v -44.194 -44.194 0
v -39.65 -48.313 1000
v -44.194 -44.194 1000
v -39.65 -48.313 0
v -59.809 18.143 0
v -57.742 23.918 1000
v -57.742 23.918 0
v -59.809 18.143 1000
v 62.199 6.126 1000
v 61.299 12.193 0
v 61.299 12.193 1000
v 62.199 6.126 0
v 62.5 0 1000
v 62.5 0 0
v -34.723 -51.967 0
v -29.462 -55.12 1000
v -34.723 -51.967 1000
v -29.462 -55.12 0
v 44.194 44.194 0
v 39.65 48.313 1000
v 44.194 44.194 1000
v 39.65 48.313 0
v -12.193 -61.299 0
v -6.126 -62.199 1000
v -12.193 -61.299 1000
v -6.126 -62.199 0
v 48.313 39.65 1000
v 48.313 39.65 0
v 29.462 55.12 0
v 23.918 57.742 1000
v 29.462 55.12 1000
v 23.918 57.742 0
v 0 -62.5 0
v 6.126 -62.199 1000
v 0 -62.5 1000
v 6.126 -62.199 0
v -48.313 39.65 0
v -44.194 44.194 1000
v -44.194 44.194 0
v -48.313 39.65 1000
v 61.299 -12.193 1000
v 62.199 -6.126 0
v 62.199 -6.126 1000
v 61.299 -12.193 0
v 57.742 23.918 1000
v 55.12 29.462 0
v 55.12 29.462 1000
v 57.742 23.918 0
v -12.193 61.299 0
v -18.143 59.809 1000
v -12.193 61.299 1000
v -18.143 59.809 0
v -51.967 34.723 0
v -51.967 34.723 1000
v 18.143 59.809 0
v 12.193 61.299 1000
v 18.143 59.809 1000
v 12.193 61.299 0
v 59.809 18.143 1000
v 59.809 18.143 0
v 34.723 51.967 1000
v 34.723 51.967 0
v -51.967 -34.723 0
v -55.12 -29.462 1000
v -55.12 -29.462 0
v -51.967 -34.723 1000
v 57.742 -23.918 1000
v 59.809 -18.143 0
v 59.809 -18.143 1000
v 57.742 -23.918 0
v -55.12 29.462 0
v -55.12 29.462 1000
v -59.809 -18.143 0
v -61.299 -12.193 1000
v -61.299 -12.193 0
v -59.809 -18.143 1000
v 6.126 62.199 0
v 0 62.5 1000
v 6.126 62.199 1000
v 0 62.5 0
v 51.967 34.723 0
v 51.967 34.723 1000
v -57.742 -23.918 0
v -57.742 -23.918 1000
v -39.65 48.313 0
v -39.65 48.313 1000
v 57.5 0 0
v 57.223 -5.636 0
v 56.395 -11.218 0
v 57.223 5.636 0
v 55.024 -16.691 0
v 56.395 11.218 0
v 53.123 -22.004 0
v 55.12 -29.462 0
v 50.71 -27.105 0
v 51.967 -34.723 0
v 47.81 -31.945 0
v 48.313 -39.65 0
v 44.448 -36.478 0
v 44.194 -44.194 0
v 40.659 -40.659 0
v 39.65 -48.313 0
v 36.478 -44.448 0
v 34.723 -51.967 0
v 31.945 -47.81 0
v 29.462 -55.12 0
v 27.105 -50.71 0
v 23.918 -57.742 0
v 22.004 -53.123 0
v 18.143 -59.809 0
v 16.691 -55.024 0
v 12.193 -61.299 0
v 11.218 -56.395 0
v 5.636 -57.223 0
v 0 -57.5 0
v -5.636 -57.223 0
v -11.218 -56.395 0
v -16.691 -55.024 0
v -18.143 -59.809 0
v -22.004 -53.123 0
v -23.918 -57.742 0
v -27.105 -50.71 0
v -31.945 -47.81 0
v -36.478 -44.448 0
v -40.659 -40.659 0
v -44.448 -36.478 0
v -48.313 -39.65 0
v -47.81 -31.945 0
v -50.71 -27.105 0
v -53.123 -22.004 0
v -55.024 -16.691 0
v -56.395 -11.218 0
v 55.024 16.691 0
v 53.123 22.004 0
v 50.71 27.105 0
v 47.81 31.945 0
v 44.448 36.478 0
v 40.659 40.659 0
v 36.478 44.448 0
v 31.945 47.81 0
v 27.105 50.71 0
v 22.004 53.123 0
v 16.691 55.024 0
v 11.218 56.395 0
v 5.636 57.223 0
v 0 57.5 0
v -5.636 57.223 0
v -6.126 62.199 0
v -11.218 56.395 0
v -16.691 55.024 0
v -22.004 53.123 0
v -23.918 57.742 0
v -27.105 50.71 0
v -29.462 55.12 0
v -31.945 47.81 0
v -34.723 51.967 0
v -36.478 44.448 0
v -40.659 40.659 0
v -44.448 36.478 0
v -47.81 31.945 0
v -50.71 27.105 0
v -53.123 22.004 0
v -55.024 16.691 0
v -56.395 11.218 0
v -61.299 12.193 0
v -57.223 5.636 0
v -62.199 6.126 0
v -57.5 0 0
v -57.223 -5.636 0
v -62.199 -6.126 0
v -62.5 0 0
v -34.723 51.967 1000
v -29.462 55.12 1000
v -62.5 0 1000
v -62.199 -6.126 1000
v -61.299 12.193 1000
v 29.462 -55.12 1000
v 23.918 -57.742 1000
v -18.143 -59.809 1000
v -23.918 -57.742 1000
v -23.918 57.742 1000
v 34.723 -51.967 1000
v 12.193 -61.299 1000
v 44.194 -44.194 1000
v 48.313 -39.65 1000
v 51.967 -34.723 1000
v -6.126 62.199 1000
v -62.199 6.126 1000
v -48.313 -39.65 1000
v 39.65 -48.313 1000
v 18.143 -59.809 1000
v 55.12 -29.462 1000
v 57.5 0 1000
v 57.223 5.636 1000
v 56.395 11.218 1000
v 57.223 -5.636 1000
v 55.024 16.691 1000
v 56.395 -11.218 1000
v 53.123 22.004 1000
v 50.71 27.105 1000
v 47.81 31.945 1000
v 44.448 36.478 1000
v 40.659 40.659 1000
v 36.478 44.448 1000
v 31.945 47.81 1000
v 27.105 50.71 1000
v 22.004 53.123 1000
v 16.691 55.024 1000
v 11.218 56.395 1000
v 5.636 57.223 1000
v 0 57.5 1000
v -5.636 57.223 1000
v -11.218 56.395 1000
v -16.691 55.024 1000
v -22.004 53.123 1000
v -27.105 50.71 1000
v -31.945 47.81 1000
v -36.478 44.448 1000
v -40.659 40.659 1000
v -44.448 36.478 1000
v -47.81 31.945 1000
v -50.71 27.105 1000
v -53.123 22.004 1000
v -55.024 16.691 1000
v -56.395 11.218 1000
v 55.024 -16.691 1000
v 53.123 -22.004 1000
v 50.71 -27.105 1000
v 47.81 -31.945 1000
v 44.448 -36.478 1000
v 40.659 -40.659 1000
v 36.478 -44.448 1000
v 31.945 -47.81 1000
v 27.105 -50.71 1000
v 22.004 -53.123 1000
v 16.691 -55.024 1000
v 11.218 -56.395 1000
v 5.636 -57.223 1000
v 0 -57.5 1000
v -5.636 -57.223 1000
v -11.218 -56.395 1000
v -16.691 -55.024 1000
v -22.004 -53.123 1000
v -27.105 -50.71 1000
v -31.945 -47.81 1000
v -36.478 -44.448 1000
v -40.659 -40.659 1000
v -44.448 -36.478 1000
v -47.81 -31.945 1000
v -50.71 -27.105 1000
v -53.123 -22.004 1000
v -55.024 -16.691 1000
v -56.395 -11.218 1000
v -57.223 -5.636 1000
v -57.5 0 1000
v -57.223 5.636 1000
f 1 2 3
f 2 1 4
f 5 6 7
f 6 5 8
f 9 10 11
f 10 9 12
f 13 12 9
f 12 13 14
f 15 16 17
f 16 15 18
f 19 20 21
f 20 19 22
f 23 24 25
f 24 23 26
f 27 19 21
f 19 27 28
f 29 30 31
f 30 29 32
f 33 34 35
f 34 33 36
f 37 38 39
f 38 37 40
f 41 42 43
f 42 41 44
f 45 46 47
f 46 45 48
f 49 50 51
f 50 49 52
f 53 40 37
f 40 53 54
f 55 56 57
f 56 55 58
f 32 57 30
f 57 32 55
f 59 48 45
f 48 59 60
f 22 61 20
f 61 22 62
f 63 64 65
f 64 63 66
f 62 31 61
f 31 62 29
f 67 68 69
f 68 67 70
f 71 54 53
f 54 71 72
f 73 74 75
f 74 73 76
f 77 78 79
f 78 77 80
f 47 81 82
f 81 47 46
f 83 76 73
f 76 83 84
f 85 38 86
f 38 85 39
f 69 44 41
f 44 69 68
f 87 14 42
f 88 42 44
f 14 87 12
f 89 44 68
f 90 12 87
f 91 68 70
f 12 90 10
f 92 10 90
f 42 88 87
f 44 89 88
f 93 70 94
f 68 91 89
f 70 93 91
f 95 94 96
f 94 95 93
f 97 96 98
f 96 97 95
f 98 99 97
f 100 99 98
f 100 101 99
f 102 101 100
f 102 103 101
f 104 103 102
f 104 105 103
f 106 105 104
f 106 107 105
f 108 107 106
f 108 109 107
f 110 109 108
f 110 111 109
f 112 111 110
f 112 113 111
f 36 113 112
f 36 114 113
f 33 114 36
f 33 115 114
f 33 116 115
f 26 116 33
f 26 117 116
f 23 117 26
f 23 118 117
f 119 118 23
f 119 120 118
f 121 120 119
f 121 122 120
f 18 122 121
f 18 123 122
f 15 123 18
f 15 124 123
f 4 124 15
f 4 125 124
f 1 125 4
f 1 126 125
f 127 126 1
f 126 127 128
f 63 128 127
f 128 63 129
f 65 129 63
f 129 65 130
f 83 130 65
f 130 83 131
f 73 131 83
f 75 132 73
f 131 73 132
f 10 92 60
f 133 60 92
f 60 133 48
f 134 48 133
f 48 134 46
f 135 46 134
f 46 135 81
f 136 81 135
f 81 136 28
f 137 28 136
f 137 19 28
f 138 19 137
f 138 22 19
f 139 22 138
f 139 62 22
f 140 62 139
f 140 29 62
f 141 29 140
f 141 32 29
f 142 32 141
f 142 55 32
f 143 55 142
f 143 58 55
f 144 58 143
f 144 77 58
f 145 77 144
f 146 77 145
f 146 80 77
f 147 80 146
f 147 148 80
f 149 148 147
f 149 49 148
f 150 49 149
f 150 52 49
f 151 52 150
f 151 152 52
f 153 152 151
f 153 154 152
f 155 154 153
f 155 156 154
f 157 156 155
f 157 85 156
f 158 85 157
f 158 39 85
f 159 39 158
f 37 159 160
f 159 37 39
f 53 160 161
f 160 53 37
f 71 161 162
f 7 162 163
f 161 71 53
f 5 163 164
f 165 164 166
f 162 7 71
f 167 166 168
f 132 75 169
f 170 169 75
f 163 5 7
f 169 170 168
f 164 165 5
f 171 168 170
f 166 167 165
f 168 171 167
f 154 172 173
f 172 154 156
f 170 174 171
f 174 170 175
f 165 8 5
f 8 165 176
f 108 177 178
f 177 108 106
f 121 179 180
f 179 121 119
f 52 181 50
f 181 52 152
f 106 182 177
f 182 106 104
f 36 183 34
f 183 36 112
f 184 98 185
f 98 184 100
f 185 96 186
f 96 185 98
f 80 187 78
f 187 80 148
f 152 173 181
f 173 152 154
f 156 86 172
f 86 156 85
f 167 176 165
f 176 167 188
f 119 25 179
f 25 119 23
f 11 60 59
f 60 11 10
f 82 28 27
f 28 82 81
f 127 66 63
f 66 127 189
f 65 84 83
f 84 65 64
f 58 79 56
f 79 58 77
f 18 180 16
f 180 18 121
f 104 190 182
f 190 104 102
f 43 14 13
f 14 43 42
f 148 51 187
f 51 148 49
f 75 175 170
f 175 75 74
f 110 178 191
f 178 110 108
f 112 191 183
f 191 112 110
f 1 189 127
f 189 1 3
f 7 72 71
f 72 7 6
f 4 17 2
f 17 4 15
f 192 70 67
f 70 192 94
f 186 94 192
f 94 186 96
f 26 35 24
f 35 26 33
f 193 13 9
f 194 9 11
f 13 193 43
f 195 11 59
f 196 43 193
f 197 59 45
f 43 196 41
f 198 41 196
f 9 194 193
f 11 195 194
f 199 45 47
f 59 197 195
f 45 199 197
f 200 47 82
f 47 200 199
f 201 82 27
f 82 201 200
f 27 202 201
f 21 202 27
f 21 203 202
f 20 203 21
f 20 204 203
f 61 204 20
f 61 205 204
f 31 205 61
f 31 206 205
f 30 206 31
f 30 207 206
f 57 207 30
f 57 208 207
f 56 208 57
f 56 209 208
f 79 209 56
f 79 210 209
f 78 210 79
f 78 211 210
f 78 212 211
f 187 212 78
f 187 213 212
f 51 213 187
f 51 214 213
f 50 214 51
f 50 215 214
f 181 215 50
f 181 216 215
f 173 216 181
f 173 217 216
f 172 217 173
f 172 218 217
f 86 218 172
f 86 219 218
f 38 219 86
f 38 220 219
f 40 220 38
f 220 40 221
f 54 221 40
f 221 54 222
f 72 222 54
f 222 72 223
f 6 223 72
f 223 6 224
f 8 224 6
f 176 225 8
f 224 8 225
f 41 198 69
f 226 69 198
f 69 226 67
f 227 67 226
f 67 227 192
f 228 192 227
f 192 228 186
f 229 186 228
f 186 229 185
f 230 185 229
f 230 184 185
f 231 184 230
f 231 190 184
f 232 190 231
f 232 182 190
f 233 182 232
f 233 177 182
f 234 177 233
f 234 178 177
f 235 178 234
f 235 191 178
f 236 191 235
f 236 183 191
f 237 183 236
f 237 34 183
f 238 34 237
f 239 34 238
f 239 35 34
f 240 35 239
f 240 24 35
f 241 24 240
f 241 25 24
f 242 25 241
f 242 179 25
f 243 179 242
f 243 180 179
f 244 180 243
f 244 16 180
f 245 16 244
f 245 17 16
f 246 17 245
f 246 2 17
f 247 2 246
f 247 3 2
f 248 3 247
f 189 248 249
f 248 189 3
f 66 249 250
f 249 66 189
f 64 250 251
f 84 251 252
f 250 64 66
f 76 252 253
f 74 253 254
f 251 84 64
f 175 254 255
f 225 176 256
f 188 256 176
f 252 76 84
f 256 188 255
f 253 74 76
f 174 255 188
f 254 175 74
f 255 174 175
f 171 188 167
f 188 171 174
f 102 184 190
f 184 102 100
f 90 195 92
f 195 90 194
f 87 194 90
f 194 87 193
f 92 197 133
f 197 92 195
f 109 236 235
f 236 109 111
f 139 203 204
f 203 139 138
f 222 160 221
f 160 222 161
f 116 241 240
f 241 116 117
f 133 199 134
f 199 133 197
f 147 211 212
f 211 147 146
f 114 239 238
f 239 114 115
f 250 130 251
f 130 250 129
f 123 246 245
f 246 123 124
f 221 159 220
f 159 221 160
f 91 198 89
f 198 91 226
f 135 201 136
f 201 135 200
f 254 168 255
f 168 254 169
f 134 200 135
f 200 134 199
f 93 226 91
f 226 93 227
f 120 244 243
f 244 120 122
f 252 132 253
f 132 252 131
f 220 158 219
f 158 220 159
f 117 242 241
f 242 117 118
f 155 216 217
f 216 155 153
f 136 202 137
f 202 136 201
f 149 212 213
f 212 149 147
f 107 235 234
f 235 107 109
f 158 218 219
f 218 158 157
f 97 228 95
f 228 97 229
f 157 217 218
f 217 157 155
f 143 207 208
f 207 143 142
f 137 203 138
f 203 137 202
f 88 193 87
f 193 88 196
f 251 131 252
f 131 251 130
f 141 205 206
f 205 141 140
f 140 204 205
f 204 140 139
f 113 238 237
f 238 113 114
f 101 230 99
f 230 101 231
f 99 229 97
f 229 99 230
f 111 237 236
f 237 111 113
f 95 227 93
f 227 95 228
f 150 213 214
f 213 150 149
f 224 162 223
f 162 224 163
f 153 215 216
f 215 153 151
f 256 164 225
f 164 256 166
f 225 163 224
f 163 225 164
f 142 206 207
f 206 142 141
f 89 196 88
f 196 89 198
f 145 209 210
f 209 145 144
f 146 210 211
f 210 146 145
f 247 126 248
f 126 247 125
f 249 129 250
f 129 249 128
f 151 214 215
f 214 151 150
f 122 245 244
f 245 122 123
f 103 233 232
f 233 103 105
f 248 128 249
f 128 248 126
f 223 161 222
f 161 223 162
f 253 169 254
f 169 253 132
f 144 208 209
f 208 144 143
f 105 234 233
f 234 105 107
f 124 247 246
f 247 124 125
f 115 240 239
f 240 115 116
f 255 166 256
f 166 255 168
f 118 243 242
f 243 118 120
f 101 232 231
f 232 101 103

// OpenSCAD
module ht_pipe() {
    difference() {
        cylinder(h=1000, d=125, $fn=64);
        translate([0, 0, -1])
            cylinder(h=1002, d=115, $fn=64);
    }
}

ht_pipe();
